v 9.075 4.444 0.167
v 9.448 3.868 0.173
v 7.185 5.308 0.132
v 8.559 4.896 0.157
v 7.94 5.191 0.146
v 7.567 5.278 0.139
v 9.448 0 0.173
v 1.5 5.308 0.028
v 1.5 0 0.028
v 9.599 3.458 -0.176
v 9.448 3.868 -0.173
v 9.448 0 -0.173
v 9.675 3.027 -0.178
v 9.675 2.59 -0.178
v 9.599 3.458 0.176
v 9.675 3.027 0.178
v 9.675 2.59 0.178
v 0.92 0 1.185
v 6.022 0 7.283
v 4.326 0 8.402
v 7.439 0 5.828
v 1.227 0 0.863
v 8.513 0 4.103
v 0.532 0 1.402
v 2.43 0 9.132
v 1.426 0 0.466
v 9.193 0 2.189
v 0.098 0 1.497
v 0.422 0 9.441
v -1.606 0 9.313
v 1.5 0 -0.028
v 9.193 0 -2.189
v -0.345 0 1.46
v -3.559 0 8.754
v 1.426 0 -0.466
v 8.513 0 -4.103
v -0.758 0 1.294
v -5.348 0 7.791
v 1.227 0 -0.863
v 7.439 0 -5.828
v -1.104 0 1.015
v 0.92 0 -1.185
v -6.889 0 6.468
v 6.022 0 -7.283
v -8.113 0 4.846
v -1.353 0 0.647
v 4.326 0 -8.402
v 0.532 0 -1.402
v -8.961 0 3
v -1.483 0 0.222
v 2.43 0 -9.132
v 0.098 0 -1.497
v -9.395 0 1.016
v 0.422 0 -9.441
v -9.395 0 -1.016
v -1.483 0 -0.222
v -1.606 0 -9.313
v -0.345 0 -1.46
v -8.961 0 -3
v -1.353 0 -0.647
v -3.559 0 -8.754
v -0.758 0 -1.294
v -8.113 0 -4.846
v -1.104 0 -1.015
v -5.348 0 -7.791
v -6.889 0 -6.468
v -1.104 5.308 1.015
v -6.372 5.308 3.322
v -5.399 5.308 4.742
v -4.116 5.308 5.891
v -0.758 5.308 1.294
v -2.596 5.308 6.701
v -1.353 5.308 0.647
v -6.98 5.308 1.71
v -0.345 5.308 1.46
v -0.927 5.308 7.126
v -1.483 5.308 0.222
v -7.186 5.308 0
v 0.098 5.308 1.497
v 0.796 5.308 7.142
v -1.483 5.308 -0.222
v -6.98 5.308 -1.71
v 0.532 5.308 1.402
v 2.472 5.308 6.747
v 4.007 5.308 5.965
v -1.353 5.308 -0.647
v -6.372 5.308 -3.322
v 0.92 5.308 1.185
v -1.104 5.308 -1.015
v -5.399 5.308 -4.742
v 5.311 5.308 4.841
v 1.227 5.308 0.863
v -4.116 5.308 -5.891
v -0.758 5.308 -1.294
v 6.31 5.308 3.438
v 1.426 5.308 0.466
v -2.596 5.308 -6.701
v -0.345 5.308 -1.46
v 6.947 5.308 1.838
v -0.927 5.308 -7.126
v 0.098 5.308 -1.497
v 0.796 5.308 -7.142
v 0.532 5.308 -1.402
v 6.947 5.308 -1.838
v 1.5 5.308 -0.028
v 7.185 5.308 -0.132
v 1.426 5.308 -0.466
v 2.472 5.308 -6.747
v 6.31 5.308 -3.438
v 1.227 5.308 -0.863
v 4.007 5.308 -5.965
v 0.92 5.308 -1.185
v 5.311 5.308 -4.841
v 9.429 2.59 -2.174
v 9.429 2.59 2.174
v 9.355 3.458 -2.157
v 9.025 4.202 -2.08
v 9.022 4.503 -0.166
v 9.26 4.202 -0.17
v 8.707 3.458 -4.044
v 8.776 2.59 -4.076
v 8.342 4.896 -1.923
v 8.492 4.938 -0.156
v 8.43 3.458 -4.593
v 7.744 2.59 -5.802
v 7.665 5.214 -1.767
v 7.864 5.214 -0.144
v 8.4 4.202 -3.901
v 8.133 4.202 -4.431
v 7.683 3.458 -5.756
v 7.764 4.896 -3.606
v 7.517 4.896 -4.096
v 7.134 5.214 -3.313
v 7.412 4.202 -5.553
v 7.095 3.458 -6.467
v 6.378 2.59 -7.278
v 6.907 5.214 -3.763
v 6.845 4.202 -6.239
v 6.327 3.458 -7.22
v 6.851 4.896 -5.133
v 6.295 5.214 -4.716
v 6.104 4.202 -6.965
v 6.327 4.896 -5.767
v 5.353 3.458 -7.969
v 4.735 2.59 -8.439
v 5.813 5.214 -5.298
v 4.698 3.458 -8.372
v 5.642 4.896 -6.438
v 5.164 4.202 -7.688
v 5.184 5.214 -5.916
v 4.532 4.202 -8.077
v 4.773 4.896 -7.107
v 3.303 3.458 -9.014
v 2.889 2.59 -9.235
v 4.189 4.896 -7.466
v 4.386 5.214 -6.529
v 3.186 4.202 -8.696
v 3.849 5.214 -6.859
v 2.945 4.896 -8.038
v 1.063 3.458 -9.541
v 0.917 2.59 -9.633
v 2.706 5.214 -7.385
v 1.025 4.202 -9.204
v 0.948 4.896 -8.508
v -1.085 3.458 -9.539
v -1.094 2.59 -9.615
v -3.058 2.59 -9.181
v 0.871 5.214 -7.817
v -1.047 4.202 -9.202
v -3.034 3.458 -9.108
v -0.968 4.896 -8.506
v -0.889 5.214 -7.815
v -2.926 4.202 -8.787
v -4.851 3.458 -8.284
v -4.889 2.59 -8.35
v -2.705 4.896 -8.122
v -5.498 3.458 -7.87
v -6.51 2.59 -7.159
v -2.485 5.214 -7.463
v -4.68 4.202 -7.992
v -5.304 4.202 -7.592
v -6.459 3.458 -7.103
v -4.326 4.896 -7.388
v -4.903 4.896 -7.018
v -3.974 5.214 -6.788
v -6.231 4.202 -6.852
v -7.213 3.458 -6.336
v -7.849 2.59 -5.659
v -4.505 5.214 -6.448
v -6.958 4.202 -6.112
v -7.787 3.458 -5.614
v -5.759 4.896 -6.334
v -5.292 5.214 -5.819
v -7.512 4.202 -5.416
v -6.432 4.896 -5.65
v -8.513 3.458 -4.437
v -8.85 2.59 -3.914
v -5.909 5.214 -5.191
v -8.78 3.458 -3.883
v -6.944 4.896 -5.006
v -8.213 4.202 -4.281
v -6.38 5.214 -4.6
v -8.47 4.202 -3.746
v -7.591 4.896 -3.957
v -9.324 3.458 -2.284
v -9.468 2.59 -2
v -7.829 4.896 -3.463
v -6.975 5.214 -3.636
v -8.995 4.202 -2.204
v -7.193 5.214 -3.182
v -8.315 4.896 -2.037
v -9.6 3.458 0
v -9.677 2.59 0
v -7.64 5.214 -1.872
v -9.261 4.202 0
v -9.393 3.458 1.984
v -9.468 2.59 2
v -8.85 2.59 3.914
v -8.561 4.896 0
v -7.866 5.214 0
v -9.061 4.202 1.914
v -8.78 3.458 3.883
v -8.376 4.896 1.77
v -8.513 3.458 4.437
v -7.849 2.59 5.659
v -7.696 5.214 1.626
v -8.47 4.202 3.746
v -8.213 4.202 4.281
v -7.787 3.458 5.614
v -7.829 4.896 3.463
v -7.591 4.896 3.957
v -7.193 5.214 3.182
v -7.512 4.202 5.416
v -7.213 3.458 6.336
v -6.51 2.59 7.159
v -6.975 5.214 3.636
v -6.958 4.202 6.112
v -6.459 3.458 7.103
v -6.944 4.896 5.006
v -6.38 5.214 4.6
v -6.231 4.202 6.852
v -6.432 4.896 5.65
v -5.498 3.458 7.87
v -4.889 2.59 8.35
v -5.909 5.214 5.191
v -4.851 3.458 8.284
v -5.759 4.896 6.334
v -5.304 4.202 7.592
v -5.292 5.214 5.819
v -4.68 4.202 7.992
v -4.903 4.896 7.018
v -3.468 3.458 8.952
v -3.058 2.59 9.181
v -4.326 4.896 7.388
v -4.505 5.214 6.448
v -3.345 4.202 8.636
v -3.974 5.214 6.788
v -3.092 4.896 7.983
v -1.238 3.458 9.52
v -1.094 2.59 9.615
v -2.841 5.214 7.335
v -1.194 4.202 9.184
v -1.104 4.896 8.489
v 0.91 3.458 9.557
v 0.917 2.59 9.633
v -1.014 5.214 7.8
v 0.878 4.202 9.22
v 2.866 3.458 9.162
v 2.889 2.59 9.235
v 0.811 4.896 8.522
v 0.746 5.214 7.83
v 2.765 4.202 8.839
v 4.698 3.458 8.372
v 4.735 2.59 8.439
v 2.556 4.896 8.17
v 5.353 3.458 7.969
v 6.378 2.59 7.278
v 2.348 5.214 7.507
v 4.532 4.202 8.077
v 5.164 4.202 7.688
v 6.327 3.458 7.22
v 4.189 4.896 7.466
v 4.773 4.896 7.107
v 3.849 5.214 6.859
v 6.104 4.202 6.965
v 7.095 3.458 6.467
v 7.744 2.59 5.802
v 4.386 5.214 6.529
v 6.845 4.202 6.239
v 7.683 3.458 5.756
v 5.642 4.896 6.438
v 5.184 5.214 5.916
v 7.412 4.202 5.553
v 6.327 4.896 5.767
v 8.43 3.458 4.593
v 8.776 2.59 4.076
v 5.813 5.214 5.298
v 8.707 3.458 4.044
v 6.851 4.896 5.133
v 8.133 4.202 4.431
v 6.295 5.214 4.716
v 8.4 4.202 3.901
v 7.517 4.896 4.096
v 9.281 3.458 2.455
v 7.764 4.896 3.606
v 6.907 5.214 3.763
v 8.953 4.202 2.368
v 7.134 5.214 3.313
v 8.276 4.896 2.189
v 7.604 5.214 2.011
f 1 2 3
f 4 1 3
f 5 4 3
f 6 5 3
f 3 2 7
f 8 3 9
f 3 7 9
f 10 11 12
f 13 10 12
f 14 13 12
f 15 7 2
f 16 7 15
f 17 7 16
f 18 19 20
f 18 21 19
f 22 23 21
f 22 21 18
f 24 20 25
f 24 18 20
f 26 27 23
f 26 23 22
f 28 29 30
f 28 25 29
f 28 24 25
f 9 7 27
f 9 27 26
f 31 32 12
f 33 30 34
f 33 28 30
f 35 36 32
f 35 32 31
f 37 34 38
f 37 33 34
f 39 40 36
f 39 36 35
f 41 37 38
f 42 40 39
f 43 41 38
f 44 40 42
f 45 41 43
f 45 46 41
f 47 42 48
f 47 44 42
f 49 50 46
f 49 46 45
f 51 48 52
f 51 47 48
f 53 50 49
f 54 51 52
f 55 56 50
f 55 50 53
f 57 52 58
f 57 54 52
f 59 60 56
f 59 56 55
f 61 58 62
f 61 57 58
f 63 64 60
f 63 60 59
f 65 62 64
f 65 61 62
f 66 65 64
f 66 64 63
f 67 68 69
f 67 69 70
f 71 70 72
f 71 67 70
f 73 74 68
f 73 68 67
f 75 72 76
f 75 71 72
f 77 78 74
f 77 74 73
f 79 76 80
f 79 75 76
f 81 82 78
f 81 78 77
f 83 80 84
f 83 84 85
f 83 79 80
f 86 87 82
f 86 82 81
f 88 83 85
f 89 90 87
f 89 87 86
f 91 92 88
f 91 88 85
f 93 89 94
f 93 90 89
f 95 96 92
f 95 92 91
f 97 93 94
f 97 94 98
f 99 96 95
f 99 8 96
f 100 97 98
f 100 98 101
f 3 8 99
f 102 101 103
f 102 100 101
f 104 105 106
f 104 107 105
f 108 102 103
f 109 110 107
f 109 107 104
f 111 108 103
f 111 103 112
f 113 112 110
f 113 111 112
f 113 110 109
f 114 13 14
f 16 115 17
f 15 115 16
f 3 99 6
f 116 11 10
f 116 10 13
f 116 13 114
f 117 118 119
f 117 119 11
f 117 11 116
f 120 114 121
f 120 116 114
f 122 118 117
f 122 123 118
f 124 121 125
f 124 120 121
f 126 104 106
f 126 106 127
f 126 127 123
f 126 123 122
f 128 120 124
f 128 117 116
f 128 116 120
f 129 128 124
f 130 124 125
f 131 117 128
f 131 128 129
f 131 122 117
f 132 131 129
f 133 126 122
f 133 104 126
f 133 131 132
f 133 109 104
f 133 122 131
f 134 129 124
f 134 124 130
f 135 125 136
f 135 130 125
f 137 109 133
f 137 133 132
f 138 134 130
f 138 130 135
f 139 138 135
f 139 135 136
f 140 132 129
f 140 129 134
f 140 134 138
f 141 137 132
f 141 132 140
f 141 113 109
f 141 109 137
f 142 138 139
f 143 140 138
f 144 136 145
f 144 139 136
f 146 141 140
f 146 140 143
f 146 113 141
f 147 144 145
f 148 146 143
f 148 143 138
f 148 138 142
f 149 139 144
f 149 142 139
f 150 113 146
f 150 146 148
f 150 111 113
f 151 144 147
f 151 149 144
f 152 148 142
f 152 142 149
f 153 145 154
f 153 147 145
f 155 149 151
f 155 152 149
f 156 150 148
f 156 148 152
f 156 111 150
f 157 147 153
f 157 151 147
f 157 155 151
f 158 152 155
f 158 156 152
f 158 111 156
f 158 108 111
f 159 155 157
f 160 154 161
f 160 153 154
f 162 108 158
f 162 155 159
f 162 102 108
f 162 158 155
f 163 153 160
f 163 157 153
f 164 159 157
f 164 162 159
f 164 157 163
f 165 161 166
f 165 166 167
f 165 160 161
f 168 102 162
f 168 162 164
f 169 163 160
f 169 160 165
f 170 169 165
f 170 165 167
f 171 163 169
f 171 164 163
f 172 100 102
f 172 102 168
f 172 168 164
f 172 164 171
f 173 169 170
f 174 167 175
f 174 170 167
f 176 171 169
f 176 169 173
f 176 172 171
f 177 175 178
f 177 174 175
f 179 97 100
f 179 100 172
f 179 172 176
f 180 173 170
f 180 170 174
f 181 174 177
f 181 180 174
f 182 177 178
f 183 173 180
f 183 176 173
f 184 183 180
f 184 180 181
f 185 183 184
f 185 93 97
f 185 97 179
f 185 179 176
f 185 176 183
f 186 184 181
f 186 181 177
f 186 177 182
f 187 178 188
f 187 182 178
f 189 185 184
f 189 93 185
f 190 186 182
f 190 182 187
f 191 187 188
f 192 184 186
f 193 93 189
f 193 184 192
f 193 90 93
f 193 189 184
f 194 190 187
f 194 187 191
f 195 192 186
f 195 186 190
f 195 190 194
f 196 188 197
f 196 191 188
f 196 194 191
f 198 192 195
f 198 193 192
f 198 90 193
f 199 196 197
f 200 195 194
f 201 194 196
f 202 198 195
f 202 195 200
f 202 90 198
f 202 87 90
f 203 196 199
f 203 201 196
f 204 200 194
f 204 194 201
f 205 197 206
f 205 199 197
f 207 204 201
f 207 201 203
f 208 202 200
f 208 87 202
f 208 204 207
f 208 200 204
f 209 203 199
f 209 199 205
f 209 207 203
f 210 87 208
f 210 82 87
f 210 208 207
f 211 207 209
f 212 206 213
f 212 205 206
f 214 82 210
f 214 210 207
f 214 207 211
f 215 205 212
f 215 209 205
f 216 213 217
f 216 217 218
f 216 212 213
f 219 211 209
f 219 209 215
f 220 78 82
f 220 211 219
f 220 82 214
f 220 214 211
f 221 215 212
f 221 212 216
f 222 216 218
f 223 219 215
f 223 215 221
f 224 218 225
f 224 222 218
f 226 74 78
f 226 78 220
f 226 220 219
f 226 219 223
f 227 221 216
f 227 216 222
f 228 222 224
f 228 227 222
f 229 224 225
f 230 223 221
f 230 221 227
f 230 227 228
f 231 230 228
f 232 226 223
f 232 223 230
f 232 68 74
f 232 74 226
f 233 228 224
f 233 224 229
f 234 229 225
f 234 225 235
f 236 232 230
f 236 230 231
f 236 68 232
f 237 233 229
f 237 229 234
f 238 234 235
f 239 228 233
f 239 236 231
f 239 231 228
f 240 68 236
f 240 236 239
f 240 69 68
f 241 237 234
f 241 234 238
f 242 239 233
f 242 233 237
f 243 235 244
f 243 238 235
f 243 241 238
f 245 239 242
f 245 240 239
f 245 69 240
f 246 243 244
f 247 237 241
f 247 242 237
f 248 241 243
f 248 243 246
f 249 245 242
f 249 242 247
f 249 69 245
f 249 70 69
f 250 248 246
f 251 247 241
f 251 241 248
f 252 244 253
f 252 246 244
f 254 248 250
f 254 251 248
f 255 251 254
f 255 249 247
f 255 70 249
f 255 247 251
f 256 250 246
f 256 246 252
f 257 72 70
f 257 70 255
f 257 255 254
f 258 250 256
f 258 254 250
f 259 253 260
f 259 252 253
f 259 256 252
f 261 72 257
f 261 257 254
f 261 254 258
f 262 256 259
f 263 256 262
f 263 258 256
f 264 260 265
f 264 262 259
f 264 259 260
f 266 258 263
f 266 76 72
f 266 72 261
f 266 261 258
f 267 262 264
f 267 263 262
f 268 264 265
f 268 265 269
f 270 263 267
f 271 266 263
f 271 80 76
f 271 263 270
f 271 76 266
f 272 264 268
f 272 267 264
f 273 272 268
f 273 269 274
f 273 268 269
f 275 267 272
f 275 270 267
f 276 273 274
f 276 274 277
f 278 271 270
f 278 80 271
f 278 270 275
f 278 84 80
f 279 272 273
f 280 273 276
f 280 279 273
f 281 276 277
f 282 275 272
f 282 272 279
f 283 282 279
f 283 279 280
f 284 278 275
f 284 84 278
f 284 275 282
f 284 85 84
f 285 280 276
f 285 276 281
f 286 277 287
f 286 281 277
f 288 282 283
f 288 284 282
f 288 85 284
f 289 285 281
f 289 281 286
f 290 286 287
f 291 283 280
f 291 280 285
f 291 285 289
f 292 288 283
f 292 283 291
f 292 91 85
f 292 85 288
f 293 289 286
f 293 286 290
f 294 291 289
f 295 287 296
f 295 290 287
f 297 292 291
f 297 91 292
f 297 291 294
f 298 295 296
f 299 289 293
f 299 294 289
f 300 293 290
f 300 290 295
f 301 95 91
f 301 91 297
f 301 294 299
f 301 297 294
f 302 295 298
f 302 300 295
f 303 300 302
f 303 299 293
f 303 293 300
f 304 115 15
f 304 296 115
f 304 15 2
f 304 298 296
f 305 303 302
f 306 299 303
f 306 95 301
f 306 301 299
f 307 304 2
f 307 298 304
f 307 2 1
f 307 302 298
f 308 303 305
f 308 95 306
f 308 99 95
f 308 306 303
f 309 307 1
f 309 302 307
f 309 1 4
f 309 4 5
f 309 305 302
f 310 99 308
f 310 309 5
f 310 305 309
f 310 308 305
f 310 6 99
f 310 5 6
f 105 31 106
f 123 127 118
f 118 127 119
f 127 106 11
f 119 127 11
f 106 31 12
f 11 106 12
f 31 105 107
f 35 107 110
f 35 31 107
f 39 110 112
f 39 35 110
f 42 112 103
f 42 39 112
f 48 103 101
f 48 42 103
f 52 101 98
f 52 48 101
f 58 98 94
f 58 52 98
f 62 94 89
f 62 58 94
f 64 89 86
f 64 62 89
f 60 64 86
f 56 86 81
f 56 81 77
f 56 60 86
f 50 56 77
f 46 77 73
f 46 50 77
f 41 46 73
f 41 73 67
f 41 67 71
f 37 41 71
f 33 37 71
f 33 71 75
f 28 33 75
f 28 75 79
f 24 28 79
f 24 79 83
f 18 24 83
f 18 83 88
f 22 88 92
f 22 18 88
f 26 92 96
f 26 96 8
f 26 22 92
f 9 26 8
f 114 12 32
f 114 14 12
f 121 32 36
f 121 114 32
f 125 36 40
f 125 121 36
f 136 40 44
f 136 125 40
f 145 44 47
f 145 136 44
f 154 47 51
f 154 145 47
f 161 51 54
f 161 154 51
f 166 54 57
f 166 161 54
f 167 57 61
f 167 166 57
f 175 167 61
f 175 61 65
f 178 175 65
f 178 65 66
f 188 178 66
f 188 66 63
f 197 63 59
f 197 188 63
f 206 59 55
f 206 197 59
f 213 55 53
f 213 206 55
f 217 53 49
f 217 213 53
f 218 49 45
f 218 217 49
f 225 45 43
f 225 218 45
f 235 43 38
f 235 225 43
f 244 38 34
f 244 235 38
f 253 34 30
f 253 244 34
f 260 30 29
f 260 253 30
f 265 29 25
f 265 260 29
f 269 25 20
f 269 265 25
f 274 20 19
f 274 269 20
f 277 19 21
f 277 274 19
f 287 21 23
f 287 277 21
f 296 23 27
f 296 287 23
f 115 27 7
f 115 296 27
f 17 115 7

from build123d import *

# Parameters (mm, degrees)
F3_DEPTH = 25


with BuildPart() as f1:
    # F0 (on Top) → F1 (revolve)
    with BuildSketch(Plane.XY):
        with BuildLine():
            Line((1.5, 5.3077938069), (1.5, 0))
            Line((1.5, 0), (9.45, 0))
            Line((9.45, 0), (9.676587279, 2.58990445))
            ThreePointArc((9.676587279, 2.58990445), (9.0292938758, 4.4967693259), (7.1861005338, 5.3077938069))
            Line((7.1861005338, 5.3077938069), (1.5, 5.3077938069))
        make_face()
    revolve(axis=Axis((0, 4.3452630795, 0), (0, 1, 0)))

    # F2 (on face) → F3 (cut)
    with BuildSketch(Plane.XZ):
        with BuildLine():
            ThreePointArc((9.45, 0), (9.4496021647, -0.0867117579), (9.4484086923, -0.1734162148))
            Line((9.4484086923, -0.1734162148), (11.2557578832, -0.2065883251))
            Line((11.2557578832, -0.2065883251), (11.2557578832, 0))
            Line((11.2557578832, 0), (11.2557578832, 0.2065883251))
            Line((11.2557578832, 0.2065883251), (9.4484086923, 0.1734162148))
            ThreePointArc((9.4484086923, 0.1734162148), (9.4496021647, 0.0867117579), (9.45, 0))
        make_face()
        with BuildLine():
            ThreePointArc((1.5, 0), (1.4999368515, -0.0137637711), (1.4997474115, -0.0275263833))
            Line((1.4997474115, -0.0275263833), (9.4484086923, -0.1734162148))
            ThreePointArc((9.4484086923, -0.1734162148), (9.4496021647, -0.0867117579), (9.45, 0))
            ThreePointArc((9.45, 0), (9.4496021647, 0.0867117579), (9.4484086923, 0.1734162148))
            Line((9.4484086923, 0.1734162148), (1.4997474115, 0.0275263833))
            ThreePointArc((1.4997474115, 0.0275263833), (1.4999368515, 0.0137637711), (1.5, 0))
        make_face()
    extrude(amount=-F3_DEPTH, mode=Mode.SUBTRACT)


solid = f1.part
